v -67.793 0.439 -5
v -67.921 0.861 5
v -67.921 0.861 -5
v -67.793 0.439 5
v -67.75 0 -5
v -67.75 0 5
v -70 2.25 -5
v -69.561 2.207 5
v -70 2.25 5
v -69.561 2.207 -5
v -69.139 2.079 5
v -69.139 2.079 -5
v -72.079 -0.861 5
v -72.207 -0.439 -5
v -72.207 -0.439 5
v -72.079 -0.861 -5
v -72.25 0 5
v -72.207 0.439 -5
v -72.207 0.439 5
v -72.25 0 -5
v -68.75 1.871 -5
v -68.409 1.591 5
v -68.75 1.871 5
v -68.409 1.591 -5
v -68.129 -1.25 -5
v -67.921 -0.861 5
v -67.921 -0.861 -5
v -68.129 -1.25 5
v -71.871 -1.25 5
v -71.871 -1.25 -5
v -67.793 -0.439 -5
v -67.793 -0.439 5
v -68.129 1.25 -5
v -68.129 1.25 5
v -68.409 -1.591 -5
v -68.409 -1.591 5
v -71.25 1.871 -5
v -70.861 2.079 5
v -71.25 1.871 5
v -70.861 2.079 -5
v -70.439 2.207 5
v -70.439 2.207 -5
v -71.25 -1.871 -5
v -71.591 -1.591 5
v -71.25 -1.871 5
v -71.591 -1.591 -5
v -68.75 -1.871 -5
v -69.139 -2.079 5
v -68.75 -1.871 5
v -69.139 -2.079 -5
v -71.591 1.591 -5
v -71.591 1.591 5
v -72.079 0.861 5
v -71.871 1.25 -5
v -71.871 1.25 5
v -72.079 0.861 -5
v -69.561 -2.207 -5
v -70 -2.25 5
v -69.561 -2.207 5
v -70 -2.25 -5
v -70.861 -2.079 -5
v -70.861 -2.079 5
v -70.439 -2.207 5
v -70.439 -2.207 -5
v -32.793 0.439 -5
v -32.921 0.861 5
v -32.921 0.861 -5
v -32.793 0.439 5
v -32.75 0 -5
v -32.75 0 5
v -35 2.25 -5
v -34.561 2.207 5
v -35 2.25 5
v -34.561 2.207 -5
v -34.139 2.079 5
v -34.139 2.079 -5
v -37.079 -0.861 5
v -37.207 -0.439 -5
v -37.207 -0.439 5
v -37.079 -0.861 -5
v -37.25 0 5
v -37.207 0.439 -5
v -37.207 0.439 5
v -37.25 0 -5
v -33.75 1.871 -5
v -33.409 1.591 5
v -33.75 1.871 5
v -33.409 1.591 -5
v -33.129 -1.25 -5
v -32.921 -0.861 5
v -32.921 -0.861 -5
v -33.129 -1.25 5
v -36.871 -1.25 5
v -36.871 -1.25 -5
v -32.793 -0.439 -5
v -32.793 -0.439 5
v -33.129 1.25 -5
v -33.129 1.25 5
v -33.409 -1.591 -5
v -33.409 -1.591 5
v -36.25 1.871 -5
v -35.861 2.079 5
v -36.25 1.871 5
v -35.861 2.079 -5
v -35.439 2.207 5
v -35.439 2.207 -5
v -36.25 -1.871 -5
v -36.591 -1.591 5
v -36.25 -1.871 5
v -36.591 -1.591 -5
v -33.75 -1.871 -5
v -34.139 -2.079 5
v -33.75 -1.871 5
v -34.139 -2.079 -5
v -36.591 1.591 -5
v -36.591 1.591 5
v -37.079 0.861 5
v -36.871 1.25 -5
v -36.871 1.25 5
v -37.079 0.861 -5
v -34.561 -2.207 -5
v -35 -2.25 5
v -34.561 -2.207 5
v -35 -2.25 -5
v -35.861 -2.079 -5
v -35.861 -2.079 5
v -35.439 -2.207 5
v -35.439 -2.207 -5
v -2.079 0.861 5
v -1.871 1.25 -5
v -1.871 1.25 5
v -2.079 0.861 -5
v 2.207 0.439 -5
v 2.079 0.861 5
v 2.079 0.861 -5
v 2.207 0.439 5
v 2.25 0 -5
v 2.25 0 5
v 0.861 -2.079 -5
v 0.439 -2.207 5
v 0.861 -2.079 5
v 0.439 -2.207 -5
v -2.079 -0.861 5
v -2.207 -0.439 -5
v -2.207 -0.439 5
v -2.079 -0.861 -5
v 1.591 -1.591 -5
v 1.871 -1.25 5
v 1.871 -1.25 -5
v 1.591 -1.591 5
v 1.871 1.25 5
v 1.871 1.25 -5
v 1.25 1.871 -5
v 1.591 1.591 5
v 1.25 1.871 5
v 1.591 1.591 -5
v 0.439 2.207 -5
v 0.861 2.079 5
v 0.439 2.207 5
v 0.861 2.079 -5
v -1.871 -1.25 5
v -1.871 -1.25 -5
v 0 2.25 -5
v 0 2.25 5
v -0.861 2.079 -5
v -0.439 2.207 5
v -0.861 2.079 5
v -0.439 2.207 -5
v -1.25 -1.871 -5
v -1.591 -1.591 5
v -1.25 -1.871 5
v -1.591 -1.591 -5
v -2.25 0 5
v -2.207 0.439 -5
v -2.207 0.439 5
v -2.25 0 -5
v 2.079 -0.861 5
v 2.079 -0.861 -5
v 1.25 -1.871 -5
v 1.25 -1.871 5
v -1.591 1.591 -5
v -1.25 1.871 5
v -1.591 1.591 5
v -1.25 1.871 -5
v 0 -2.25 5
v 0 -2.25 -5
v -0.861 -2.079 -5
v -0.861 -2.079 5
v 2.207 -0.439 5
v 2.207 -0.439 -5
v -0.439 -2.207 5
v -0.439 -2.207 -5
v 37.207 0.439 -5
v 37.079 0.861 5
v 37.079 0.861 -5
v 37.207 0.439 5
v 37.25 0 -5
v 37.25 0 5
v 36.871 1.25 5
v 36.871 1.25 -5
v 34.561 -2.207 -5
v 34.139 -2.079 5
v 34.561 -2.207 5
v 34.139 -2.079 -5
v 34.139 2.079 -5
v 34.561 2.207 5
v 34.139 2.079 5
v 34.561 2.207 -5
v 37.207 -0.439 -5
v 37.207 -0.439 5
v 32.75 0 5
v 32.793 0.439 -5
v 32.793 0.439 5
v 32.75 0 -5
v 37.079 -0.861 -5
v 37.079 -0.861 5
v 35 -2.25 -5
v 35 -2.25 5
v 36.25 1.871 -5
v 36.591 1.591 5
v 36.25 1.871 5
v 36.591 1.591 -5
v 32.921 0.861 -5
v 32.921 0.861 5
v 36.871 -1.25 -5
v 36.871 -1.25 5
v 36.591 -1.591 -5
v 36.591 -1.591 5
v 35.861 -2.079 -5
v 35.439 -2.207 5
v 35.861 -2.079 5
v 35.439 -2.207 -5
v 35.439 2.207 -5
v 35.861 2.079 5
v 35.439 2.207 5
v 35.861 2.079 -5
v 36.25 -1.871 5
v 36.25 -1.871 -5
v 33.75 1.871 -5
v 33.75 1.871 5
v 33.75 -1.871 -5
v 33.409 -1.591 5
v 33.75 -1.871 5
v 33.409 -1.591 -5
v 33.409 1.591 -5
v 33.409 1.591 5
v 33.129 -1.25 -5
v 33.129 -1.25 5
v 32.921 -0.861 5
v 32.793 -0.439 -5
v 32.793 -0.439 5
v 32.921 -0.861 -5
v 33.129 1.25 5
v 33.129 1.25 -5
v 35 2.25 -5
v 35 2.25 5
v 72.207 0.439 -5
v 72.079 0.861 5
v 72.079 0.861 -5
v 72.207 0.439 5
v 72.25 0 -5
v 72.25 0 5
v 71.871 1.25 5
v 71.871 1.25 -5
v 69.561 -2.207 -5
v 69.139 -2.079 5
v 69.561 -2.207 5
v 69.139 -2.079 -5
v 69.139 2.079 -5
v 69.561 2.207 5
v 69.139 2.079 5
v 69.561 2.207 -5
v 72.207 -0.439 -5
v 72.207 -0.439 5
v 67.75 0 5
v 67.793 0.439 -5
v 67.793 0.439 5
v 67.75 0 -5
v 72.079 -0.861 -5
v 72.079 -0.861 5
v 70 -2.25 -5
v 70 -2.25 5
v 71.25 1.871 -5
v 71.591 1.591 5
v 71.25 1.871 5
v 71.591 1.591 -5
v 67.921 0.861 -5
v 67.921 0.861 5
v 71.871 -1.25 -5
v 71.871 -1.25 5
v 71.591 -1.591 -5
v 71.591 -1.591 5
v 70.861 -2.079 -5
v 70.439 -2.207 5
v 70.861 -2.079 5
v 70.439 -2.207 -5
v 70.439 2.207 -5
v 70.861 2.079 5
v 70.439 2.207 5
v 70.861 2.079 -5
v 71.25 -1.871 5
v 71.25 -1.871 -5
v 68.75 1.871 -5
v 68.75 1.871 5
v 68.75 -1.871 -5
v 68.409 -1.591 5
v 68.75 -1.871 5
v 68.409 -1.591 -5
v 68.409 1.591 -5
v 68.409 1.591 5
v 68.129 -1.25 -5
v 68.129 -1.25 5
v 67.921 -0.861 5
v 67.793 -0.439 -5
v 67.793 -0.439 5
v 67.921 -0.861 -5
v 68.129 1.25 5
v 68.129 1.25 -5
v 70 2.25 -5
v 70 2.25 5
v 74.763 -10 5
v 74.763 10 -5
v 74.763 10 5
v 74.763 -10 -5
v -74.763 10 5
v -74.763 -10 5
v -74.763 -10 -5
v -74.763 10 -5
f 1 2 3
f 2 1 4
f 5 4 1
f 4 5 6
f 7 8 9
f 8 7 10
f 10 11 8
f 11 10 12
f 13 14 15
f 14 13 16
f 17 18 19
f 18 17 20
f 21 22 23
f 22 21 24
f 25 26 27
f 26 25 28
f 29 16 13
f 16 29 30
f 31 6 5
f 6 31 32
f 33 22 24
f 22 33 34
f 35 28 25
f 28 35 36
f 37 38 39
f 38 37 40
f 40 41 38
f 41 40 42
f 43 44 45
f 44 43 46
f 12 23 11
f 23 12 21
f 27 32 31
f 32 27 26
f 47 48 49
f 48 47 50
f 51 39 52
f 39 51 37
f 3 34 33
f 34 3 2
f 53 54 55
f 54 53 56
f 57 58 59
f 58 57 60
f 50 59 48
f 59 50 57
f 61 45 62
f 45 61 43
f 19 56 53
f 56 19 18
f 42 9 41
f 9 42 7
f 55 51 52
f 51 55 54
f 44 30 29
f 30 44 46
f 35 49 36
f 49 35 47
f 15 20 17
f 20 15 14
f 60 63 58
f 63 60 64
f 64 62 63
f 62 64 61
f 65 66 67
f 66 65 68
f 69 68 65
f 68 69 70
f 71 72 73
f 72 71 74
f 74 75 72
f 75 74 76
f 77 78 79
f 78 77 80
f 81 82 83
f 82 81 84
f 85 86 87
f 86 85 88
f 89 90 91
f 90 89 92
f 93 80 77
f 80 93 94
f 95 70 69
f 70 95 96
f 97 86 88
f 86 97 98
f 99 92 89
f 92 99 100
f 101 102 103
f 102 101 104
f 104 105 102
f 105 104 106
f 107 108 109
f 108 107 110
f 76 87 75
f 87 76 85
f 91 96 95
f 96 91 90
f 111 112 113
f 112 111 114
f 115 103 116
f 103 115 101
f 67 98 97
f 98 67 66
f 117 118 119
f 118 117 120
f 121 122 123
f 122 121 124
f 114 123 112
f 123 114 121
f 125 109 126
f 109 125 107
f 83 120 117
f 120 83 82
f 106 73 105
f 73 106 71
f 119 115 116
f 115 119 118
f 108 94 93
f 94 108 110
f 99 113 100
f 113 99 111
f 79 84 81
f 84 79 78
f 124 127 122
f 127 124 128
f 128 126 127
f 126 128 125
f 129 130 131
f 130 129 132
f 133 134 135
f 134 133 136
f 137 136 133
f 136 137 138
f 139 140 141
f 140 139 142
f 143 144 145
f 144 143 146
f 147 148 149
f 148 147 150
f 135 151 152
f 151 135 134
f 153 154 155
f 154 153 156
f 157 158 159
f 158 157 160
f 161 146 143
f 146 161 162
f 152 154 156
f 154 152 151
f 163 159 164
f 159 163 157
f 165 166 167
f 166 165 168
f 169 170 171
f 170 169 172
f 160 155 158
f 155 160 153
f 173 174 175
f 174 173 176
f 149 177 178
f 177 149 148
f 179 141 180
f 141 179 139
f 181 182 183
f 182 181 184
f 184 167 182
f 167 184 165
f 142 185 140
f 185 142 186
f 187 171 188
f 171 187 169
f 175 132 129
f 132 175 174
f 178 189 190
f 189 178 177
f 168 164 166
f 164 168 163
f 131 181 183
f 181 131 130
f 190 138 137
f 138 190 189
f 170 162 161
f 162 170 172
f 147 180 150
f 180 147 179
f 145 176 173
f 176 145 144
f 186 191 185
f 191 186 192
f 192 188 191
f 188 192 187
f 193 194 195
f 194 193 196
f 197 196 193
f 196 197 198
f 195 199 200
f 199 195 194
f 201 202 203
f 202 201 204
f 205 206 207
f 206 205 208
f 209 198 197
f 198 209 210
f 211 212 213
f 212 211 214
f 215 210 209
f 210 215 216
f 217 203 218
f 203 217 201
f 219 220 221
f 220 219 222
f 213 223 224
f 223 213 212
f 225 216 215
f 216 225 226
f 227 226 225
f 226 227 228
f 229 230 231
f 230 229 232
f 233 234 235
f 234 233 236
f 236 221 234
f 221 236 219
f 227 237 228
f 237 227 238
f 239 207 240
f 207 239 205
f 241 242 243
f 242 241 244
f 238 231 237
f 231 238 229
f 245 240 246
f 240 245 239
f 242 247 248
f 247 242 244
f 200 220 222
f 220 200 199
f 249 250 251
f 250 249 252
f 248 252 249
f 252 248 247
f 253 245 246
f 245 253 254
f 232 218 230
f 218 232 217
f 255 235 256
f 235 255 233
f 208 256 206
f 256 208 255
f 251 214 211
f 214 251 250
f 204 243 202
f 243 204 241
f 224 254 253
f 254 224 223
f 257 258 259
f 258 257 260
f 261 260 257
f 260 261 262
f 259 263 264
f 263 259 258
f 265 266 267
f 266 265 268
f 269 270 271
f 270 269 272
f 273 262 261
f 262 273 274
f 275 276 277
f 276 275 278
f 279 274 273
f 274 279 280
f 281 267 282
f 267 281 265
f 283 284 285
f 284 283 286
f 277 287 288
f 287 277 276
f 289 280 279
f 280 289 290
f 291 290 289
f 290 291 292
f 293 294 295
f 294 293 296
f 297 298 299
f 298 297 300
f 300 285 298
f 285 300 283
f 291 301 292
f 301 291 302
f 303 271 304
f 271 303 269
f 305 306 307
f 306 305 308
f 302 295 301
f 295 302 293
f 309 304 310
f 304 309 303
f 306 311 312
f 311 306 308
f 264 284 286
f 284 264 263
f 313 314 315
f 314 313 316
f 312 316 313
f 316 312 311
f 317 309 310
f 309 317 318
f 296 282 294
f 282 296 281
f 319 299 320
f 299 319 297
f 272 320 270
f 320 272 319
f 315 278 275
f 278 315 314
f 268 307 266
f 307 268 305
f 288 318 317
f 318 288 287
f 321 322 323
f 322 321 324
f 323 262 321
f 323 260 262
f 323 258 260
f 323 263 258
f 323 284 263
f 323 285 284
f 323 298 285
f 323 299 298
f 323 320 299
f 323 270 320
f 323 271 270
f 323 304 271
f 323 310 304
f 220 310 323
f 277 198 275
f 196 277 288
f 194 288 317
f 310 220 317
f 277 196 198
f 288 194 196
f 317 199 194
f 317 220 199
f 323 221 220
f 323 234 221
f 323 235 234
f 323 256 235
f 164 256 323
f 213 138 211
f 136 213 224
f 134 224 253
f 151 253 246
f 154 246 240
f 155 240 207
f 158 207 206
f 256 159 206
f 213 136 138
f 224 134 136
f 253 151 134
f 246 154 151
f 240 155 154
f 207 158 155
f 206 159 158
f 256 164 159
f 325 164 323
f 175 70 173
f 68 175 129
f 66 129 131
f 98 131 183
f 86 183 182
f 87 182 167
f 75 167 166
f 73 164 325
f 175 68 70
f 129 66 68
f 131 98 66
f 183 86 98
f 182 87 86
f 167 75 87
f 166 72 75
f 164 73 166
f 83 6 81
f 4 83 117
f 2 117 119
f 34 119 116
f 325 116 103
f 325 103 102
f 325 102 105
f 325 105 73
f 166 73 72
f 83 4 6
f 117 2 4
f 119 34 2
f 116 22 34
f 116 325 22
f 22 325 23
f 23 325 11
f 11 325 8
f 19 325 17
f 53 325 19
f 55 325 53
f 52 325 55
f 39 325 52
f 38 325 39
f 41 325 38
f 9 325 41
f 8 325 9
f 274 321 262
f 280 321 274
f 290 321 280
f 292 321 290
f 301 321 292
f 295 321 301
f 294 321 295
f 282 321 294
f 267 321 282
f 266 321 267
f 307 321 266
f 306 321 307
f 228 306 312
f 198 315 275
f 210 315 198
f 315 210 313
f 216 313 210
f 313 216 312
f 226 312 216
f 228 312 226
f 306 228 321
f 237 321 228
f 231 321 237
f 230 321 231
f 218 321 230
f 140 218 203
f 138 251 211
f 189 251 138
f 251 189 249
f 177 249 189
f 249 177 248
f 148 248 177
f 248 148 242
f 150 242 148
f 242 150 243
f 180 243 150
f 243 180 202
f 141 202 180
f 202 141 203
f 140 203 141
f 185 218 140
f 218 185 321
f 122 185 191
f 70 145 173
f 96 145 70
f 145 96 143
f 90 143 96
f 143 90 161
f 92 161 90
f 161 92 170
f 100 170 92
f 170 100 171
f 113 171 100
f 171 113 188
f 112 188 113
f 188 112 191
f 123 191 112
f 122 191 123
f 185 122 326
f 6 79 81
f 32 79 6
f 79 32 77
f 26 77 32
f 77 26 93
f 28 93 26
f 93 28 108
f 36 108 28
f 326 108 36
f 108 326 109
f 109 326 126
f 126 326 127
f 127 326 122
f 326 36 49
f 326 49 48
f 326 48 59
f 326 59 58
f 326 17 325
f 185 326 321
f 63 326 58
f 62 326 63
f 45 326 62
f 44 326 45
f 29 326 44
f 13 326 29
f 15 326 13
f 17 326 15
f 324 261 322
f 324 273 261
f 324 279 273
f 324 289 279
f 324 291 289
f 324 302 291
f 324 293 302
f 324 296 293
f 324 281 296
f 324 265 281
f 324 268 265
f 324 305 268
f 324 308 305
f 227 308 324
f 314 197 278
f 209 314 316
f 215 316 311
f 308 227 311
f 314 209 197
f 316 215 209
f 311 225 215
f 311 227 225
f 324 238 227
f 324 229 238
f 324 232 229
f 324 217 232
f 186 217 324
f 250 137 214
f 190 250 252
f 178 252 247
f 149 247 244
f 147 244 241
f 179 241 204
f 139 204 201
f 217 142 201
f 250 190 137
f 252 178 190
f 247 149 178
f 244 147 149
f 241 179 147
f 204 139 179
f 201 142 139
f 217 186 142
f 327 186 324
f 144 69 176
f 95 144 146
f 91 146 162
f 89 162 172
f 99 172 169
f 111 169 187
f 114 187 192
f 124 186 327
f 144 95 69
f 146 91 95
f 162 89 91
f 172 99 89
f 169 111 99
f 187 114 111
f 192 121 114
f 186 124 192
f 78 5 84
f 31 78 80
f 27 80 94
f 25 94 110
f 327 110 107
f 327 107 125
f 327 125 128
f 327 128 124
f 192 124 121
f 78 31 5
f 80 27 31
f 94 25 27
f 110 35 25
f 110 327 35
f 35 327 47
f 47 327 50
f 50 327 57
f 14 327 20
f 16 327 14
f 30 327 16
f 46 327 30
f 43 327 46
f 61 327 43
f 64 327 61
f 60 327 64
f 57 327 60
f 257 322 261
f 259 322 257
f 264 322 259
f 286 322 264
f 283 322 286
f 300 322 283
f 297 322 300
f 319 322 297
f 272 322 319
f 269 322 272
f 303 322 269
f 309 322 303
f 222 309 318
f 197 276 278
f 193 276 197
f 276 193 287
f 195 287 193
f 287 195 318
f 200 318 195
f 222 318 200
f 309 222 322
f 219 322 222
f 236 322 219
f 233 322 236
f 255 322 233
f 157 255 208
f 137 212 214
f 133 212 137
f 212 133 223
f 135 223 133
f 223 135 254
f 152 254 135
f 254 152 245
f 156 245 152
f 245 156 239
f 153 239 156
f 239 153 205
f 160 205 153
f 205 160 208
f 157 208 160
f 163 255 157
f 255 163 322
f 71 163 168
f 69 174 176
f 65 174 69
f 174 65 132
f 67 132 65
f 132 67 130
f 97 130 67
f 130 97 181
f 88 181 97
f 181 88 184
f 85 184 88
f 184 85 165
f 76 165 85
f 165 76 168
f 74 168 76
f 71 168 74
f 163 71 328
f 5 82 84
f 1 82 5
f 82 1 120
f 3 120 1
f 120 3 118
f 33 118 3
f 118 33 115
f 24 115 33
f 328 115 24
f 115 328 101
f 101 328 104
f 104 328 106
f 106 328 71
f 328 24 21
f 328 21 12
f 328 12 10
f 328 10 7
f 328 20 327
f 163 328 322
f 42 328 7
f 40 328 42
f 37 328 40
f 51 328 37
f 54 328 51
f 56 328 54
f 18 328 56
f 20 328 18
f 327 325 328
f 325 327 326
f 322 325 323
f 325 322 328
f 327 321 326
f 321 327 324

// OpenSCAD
$fn = 32;

// ----------------------------------------------------------------------
// Hole bar, 5 x Ø4.5
// skip layout, 4.7625 mm edge offset
// ----------------------------------------------------------------------

// --- parameters (mm) ---
bar_w = 20;         // bar width (Y)
bar_t = 10;         // bar thickness (Z)
holes = 5;          // holes per row
hole_d = 4.5;       // hole diameter
edge = 4.763;       // offset from the bar end to the first hole
grid_pitch = 17.5;  // grid the bar was laid out on

// --- derived feature positions (mm) ---
pitch = grid_pitch * 2;       // = 35   holes sit every other grid slot
span = (holes - 1) * pitch;   // = 140   distance between the end holes
bar_l = span + 2 * edge;      // = 149.53   overall bar length
start_x = -bar_l / 2 + edge;  // = -70   X of the first hole
feature_centers = [
  [start_x + 0 * pitch, 0],
  [start_x + 1 * pitch, 0],
  [start_x + 2 * pitch, 0],
  [start_x + 3 * pitch, 0],
  [start_x + 4 * pitch, 0]
];   // hole centres of the first row

// bar with one row of holes, drilled from feature_centers
difference() {
  translate([-bar_l / 2, -bar_w / 2, -bar_t / 2]) cube([bar_l, bar_w, bar_t]);
  for (centre = feature_centers)
    translate([centre[0], centre[1], 0])
      cylinder(d = hole_d, h = bar_t + 2, center = true);
}
